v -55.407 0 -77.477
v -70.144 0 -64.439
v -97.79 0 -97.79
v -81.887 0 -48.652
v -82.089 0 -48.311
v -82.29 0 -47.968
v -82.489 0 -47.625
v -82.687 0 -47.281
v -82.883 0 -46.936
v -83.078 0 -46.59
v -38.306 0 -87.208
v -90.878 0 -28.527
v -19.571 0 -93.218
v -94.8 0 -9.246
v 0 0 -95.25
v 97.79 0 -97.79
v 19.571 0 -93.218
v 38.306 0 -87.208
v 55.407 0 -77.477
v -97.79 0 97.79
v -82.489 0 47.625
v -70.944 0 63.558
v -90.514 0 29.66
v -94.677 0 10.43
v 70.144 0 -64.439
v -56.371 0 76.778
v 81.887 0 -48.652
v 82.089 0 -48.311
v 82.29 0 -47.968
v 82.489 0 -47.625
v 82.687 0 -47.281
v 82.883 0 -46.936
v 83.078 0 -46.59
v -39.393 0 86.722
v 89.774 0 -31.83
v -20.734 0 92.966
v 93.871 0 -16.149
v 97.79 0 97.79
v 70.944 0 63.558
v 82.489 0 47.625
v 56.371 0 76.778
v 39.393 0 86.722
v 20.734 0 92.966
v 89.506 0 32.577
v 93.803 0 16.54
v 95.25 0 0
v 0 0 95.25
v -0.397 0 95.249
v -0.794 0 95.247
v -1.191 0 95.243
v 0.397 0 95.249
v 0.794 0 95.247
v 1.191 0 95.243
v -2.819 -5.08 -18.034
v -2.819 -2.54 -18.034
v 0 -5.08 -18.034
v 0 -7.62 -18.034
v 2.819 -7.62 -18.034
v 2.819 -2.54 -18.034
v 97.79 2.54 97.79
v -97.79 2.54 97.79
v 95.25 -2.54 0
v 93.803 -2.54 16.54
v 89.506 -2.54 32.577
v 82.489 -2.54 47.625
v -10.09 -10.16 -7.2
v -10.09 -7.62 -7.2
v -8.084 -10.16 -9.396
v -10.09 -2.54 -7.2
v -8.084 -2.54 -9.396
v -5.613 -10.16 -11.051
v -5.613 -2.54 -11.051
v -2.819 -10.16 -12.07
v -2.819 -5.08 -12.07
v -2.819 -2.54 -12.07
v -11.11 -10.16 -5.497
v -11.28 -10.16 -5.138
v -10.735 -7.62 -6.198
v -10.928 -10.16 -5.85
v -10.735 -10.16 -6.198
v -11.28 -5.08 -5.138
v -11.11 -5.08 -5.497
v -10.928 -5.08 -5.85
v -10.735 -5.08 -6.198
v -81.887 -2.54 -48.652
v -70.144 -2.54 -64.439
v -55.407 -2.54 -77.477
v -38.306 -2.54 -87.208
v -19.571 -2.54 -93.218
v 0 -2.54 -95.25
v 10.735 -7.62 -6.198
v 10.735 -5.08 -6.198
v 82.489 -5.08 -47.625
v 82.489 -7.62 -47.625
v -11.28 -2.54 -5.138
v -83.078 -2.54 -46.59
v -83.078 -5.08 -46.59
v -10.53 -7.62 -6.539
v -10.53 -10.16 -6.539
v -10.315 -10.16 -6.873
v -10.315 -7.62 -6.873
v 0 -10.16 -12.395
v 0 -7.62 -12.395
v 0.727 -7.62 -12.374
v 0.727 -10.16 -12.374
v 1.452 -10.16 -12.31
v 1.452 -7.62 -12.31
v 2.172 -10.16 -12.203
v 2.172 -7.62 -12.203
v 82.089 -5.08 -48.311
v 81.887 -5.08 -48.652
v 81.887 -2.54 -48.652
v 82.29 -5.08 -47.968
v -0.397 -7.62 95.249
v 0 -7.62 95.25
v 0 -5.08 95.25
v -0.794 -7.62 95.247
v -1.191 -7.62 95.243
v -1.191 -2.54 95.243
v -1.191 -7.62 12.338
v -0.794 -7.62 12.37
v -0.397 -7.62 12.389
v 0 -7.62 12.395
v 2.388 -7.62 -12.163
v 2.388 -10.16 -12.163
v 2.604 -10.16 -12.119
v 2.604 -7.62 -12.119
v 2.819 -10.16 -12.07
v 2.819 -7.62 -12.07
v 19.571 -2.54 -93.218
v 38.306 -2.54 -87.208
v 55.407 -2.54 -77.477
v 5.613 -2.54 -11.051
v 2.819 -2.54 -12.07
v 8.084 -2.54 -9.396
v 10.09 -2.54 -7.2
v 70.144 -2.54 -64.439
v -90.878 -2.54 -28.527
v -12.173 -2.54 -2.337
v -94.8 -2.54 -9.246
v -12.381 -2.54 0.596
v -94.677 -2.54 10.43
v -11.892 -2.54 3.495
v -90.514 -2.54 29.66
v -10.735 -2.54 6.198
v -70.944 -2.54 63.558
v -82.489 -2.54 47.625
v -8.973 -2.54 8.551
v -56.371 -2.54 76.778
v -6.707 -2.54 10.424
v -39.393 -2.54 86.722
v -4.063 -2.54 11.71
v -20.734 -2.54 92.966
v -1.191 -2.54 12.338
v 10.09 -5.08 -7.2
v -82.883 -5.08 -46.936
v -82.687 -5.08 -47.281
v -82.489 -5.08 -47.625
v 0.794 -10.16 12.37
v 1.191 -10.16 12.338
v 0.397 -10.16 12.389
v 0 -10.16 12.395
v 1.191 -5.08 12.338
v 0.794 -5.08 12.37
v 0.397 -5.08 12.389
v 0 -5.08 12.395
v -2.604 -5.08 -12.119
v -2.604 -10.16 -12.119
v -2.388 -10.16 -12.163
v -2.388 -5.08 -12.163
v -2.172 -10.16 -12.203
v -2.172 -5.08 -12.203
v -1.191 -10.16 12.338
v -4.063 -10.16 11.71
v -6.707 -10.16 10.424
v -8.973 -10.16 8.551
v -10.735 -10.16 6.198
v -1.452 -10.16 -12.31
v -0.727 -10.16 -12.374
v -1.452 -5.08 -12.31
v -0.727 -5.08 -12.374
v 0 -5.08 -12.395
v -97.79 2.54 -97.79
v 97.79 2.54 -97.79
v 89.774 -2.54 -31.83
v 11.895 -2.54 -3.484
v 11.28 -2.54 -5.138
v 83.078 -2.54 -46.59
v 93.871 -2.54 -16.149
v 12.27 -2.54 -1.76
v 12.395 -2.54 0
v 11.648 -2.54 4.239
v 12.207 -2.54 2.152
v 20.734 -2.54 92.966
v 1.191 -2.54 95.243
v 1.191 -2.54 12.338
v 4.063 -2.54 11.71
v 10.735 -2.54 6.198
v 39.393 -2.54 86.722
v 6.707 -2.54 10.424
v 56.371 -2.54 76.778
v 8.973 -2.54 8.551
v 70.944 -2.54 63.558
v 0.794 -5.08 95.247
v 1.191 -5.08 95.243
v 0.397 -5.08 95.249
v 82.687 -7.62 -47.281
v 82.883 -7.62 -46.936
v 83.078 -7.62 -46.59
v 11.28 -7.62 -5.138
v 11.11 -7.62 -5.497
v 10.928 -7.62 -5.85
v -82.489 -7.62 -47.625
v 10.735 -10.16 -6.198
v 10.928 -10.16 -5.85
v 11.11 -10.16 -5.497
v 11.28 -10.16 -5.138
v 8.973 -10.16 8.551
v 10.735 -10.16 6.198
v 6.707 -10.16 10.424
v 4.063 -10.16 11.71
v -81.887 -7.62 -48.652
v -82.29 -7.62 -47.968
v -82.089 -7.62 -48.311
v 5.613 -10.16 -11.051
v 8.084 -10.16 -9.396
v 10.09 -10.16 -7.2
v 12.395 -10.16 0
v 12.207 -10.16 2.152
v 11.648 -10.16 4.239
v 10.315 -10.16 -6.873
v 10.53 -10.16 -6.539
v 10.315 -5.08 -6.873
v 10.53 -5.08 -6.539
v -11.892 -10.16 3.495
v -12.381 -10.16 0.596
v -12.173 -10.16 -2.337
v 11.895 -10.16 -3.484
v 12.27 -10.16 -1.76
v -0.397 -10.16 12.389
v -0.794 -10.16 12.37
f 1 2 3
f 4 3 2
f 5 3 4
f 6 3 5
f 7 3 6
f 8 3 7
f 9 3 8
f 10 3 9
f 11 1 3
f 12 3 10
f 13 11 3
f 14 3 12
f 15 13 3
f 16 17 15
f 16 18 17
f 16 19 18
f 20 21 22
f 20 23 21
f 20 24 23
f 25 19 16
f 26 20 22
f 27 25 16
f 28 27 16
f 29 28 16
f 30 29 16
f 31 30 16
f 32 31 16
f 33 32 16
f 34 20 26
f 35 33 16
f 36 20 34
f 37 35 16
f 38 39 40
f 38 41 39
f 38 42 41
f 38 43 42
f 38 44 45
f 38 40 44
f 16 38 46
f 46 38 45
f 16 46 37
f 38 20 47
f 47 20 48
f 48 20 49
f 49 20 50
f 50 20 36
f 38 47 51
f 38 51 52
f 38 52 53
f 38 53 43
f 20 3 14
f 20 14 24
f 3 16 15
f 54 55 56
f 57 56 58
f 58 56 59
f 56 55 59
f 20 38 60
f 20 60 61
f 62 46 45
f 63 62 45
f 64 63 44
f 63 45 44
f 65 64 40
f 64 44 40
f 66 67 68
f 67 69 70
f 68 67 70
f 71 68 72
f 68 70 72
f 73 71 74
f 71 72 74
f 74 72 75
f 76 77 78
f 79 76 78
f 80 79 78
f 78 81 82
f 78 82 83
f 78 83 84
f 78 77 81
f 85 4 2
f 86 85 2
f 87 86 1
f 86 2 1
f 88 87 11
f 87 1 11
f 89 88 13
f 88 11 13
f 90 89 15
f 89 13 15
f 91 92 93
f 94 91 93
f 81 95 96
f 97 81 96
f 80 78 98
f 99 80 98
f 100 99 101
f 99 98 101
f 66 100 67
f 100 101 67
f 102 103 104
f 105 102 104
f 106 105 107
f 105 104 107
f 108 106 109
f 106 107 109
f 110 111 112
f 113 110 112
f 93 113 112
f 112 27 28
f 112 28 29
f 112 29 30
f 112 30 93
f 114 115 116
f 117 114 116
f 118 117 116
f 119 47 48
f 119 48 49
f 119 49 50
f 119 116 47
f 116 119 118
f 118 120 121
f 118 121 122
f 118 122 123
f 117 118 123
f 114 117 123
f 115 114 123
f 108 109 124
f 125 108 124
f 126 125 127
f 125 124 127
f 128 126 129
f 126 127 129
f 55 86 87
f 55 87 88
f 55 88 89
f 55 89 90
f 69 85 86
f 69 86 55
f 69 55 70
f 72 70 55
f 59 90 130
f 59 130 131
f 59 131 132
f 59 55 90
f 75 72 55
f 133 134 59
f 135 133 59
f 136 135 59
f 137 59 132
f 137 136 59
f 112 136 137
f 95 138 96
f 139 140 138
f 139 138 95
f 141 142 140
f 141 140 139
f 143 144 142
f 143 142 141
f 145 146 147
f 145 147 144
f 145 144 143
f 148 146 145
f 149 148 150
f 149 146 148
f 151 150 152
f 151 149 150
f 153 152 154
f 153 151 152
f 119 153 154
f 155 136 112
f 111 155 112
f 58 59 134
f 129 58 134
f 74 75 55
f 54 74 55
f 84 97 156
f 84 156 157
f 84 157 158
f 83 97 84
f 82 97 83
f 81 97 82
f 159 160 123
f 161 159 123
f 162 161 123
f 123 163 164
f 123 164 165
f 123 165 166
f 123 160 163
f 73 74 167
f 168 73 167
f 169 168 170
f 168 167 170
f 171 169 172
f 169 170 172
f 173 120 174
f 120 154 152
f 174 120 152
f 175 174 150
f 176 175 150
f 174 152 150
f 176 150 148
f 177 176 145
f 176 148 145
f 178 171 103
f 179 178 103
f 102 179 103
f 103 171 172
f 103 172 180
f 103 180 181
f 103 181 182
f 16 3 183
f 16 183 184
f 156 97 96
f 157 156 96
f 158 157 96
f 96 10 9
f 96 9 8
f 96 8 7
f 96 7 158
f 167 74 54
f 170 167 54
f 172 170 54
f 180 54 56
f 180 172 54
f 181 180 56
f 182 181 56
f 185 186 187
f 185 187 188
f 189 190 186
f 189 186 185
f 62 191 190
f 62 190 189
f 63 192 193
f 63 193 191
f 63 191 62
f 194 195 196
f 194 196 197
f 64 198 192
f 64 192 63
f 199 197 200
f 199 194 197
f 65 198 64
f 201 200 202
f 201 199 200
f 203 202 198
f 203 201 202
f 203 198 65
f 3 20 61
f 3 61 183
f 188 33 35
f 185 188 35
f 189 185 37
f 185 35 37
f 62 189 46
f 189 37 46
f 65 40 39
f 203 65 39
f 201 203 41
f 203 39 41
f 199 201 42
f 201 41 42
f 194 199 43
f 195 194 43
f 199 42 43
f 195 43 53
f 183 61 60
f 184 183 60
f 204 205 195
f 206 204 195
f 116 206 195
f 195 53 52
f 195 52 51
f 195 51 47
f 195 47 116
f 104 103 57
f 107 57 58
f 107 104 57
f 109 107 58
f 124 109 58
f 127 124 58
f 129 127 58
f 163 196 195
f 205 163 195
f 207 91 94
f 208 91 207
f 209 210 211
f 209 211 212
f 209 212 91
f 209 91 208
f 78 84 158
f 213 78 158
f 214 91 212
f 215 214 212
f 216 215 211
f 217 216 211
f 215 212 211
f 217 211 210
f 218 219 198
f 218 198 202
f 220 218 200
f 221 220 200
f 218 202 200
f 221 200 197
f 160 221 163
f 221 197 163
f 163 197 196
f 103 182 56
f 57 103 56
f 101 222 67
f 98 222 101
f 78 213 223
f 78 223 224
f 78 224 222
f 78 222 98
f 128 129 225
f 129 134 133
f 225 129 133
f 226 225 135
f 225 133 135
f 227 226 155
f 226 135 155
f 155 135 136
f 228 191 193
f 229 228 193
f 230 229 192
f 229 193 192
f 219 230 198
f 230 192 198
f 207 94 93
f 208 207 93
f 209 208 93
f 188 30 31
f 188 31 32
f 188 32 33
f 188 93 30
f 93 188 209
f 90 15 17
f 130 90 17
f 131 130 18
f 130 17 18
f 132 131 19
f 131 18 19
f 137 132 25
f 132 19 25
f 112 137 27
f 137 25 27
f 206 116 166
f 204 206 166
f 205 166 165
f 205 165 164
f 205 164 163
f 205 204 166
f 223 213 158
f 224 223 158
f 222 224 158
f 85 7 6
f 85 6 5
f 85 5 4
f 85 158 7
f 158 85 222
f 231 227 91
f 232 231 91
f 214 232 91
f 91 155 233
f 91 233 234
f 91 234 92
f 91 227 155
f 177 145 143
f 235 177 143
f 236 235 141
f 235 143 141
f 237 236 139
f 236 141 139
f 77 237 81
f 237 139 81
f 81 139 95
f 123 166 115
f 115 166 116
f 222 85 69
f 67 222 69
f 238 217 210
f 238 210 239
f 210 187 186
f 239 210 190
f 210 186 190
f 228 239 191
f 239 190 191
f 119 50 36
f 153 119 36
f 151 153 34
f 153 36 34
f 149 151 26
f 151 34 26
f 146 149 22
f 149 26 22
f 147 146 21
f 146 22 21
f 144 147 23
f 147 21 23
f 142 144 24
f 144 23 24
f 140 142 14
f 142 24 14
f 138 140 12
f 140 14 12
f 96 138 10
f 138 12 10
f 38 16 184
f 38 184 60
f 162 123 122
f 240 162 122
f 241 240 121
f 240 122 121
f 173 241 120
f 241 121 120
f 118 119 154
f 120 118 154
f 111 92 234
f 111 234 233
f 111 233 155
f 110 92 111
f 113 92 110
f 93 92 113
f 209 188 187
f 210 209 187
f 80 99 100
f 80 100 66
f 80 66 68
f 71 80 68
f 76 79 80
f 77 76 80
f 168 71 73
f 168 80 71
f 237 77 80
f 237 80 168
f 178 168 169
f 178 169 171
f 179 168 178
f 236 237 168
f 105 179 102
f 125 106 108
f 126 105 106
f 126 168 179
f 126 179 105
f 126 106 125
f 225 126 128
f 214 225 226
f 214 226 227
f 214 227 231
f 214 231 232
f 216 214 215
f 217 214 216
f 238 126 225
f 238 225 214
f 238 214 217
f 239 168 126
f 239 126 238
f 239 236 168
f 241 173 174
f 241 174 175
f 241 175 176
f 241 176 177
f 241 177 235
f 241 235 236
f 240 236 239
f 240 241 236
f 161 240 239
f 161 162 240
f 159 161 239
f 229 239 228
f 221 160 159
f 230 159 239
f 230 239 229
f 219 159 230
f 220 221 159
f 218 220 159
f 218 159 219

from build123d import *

# Parameters (mm, degrees)
F1_DEPTH = 2.54
F2_DEPTH = 5.08
F3_DEPTH = 2.54
F4_DEPTH = 7.62
F5_DEPTH = 10.16


with BuildPart() as f1:
    # F0 (on Front) → F1 (new body)
    with BuildSketch(Plane.XZ):
        with BuildLine():
            ThreePointArc((82.4889197105, 47.625), (92.004434954, 24.652514046), (95.25, 0))
            ThreePointArc((95.25, 0), (92.156719127, -24.0769935778), (83.0777875119, -46.5901676551))
            ThreePointArc((83.0777875119, -46.5901676551), (82.7849705841, -47.1085039605), (82.4889197105, -47.625))
            ThreePointArc((82.4889197105, -47.625), (82.1896464561, -48.1396355971), (81.8871625119, -48.6523906479))
            ThreePointArc((81.8871625119, -48.6523906479), (47.1085039605, -82.7849705841), (0, -95.25))
            Line((0, -95.25), (0, -97.79))
            Line((0, -97.79), (97.79, -97.79))
            Line((97.79, -97.79), (97.79, 97.79))
            Line((97.79, 97.79), (0, 97.79))
            Line((0, 97.79), (0, 95.25))
            ThreePointArc((0, 95.25), (0.595324128, 95.2481395576), (1.190625, 95.242558303))
            ThreePointArc((1.190625, 95.242558303), (48.1396355971, 82.1896464561), (82.4889197105, 47.625))
        make_face()
        with BuildLine():
            ThreePointArc((-1.190625, 95.242558303), (-0.595324128, 95.2481395576), (0, 95.25))
            Line((0, 95.25), (0, 97.79))
            Line((0, 97.79), (-97.79, 97.79))
            Line((-97.79, 97.79), (-97.79, -97.79))
            Line((-97.79, -97.79), (0, -97.79))
            Line((0, -97.79), (0, -95.25))
            ThreePointArc((0, -95.25), (-47.1085039605, -82.7849705841), (-81.8871625119, -48.6523906479))
            ThreePointArc((-81.8871625119, -48.6523906479), (-82.1896464561, -48.1396355971), (-82.4889197105, -47.625))
            ThreePointArc((-82.4889197105, -47.625), (-82.7849705841, -47.1085039605), (-83.0777875119, -46.5901676551))
            ThreePointArc((-83.0777875119, -46.5901676551), (-95.2481395576, 0.595324128), (-82.4889197105, 47.625))
            ThreePointArc((-82.4889197105, 47.625), (-48.1396355971, 82.1896464561), (-1.190625, 95.242558303))
        make_face()
        with BuildLine():
            Line((-1.190625, 12.3378845492), (-1.190625, 95.242558303))
            ThreePointArc((-1.190625, 95.242558303), (-48.1396355971, 82.1896464561), (-82.4889197105, 47.625))
            Line((-82.4889197105, 47.625), (-10.734558085, 6.1976))
            ThreePointArc((-10.734558085, 6.1976), (-6.7065841894, 10.4241408064), (-1.190625, 12.3378845492))
        make_face()
        with BuildLine():
            Line((0, -12.3952), (0, -1.3748153285))
            Line((0, -1.3748153285), (-2.1717, -2.6286469081))
            Line((-2.1717, -2.6286469081), (-2.1717, -12.2034709059))
            ThreePointArc((-2.1717, -12.2034709059), (-1.0900734993, -12.3471746892), (0, -12.3952))
        make_face()
        with BuildLine():
            ThreePointArc((0, -95.25), (47.1085039605, -82.7849705841), (81.8871625119, -48.6523906479))
            Line((81.8871625119, -48.6523906479), (10.0896089486, -7.200053771))
            ThreePointArc((10.0896089486, -7.200053771), (6.8985820933, -10.2980846832), (2.8194, -12.0702927338))
            Line((2.8194, -12.0702927338), (2.8194, -15.2146))
            Line((2.8194, -15.2146), (2.8194, -18.034))
            Line((2.8194, -18.034), (0, -18.034))
            Line((0, -18.034), (0, -95.25))
        make_face()
        with BuildLine():
            Line((1.190625, 0.6874076643), (10.734558085, 6.1976))
            ThreePointArc((10.734558085, 6.1976), (6.7065841894, 10.4241408064), (1.190625, 12.3378845492))
            Line((1.190625, 12.3378845492), (1.190625, 0.6874076643))
        make_face()
        with BuildLine():
            Line((-1.190625, 0.6874076643), (-1.190625, 12.3378845492))
            ThreePointArc((-1.190625, 12.3378845492), (-6.7065841894, 10.4241408064), (-10.734558085, 6.1976))
            Line((-10.734558085, 6.1976), (-1.190625, 0.6874076643))
        make_face()
        with BuildLine():
            Line((-2.8194, -3.0025966775), (-10.0896089486, -7.200053771))
            ThreePointArc((-10.0896089486, -7.200053771), (-6.8985820933, -10.2980846832), (-2.8194, -12.0702927338))
            Line((-2.8194, -12.0702927338), (-2.8194, -3.0025966775))
        make_face()
        with BuildLine():
            ThreePointArc((2.8194, -12.0702927338), (6.8985820933, -10.2980846832), (10.0896089486, -7.200053771))
            Line((10.0896089486, -7.200053771), (2.8194, -3.0025966775))
            Line((2.8194, -3.0025966775), (2.8194, -12.0702927338))
        make_face()
        with BuildLine():
            ThreePointArc((-81.8871625119, -48.6523906479), (-47.1085039605, -82.7849705841), (0, -95.25))
            Line((0, -95.25), (0, -18.034))
            Line((0, -18.034), (-2.8194, -18.034))
            Line((-2.8194, -18.034), (-2.8194, -15.2146))
            Line((-2.8194, -15.2146), (-2.8194, -12.0702927338))
            ThreePointArc((-2.8194, -12.0702927338), (-6.8985820933, -10.2980846832), (-10.0896089486, -7.200053771))
            Line((-10.0896089486, -7.200053771), (-81.8871625119, -48.6523906479))
        make_face()
        with BuildLine():
            Line((-10.734558085, 6.1976), (-82.4889197105, 47.625))
            ThreePointArc((-82.4889197105, 47.625), (-95.2481395576, 0.595324128), (-83.0777875119, -46.5901676551))
            Line((-83.0777875119, -46.5901676551), (-11.2802339486, -5.1378307782))
            ThreePointArc((-11.2802339486, -5.1378307782), (-12.3808628456, 0.5960018774), (-10.734558085, 6.1976))
        make_face()
        with BuildLine():
            Line((-2.8194, -0.2529660204), (-1.190625, 0.6874076643))
            Line((-1.190625, 0.6874076643), (-10.734558085, 6.1976))
            ThreePointArc((-10.734558085, 6.1976), (-12.3808628456, 0.5960018774), (-11.2802339486, -5.1378307782))
            Line((-11.2802339486, -5.1378307782), (-2.8194, -0.2529660204))
        make_face()
        with BuildLine():
            ThreePointArc((83.0777875119, -46.5901676551), (92.156719127, -24.0769935778), (95.25, 0))
            ThreePointArc((95.25, 0), (92.004434954, 24.652514046), (82.4889197105, 47.625))
            Line((82.4889197105, 47.625), (10.734558085, 6.1976))
            ThreePointArc((10.734558085, 6.1976), (11.972843802, 3.2081138279), (12.3952, 0))
            ThreePointArc((12.3952, 0), (12.1132518111, -2.6287094933), (11.2802339486, -5.1378307782))
            Line((11.2802339486, -5.1378307782), (83.0777875119, -46.5901676551))
        make_face()
        with BuildLine():
            Line((10.734558085, 6.1976), (82.4889197105, 47.625))
            ThreePointArc((82.4889197105, 47.625), (48.1396355971, 82.1896464561), (1.190625, 95.242558303))
            Line((1.190625, 95.242558303), (1.190625, 12.3378845492))
            ThreePointArc((1.190625, 12.3378845492), (6.7065841894, 10.4241408064), (10.734558085, 6.1976))
        make_face()
        with BuildLine():
            ThreePointArc((12.3952, 0), (11.972843802, 3.2081138279), (10.734558085, 6.1976))
            Line((10.734558085, 6.1976), (1.190625, 0.6874076643))
            Line((1.190625, 0.6874076643), (2.8194, -0.2529660204))
            Line((2.8194, -0.2529660204), (11.2802339486, -5.1378307782))
            ThreePointArc((11.2802339486, -5.1378307782), (12.1132518111, -2.6287094933), (12.3952, 0))
        make_face()
        with BuildLine():
            Line((2.1717, -2.6286469081), (0, -1.3748153285))
            Line((0, -1.3748153285), (0, -12.3952))
            ThreePointArc((0, -12.3952), (1.0900734993, -12.3471746892), (2.1717, -12.2034709059))
            Line((2.1717, -12.2034709059), (2.1717, -2.6286469081))
        make_face()
        with BuildLine():
            ThreePointArc((-2.1717, -13.4166190574), (-1.199956018, -12.6633019157), (0, -12.3952))
            ThreePointArc((0, -12.3952), (-1.0900734993, -12.3471746892), (-2.1717, -12.2034709059))
            Line((-2.1717, -12.2034709059), (-2.1717, -13.4166190574))
        make_face()
        with BuildLine():
            ThreePointArc((10.734558085, -6.1976), (11.0201426838, -5.6742786563), (11.2802339486, -5.1378307782))
            Line((11.2802339486, -5.1378307782), (2.8194, -0.2529660204))
            Line((2.8194, -0.2529660204), (2.8194, -1.627781349))
            Line((2.8194, -1.627781349), (10.734558085, -6.1976))
        make_face()
        with BuildLine():
            Line((-2.1717, -12.2034709059), (-2.1717, -2.6286469081))
            Line((-2.1717, -2.6286469081), (-2.8194, -3.0025966775))
            Line((-2.8194, -3.0025966775), (-2.8194, -12.0702927338))
            ThreePointArc((-2.8194, -12.0702927338), (-2.4964382446, -12.1412017169), (-2.1717, -12.2034709059))
        make_face()
        with BuildLine():
            Line((-10.734558085, -6.1976), (-2.8194, -1.627781349))
            Line((-2.8194, -1.627781349), (-2.8194, -0.2529660204))
            Line((-2.8194, -0.2529660204), (-11.2802339486, -5.1378307782))
            ThreePointArc((-11.2802339486, -5.1378307782), (-11.0201426838, -5.6742786563), (-10.734558085, -6.1976))
        make_face()
        with BuildLine():
            Line((1.190625, 0.6874076643), (1.190625, 12.3378845492))
            ThreePointArc((1.190625, 12.3378845492), (0.5960018774, 12.3808628456), (0, 12.3952))
            Line((0, 12.3952), (0, 0))
            Line((0, 0), (1.190625, 0.6874076643))
        make_face()
        with BuildLine():
            Line((-11.2802339486, -5.1378307782), (-83.0777875119, -46.5901676551))
            ThreePointArc((-83.0777875119, -46.5901676551), (-82.7849705841, -47.1085039605), (-82.4889197105, -47.625))
            Line((-82.4889197105, -47.625), (-10.734558085, -6.1976))
            ThreePointArc((-10.734558085, -6.1976), (-11.0201426838, -5.6742786563), (-11.2802339486, -5.1378307782))
        make_face()
        with BuildLine():
            Line((0, 0), (0, 12.3952))
            ThreePointArc((0, 12.3952), (-0.5960018774, 12.3808628456), (-1.190625, 12.3378845492))
            Line((-1.190625, 12.3378845492), (-1.190625, 0.6874076643))
            Line((-1.190625, 0.6874076643), (0, 0))
        make_face()
        with BuildLine():
            ThreePointArc((-82.4889197105, -47.625), (-82.1896464561, -48.1396355971), (-81.8871625119, -48.6523906479))
            Line((-81.8871625119, -48.6523906479), (-10.0896089486, -7.200053771))
            ThreePointArc((-10.0896089486, -7.200053771), (-10.4241408064, -6.7065841894), (-10.734558085, -6.1976))
            Line((-10.734558085, -6.1976), (-82.4889197105, -47.625))
        make_face()
        Polygon((-2.1717, -2.6286469081), (-2.1717, -1.2538315796), (-2.8194, -1.627781349), (-2.8194, -3.0025966775), align=None)
        with BuildLine():
            Line((0, 12.3952), (0, 95.25))
            ThreePointArc((0, 95.25), (-0.595324128, 95.2481395576), (-1.190625, 95.242558303))
            Line((-1.190625, 95.242558303), (-1.190625, 12.3378845492))
            ThreePointArc((-1.190625, 12.3378845492), (-0.5960018774, 12.3808628456), (0, 12.3952))
        make_face()
        with BuildLine():
            ThreePointArc((10.0896089486, -7.200053771), (10.4241408064, -6.7065841894), (10.734558085, -6.1976))
            Line((10.734558085, -6.1976), (2.8194, -1.627781349))
            Line((2.8194, -1.627781349), (2.8194, -3.0025966775))
            Line((2.8194, -3.0025966775), (10.0896089486, -7.200053771))
        make_face()
        with BuildLine():
            Line((-2.8194, -3.0025966775), (-2.8194, -1.627781349))
            Line((-2.8194, -1.627781349), (-10.734558085, -6.1976))
            ThreePointArc((-10.734558085, -6.1976), (-10.4241408064, -6.7065841894), (-10.0896089486, -7.200053771))
            Line((-10.0896089486, -7.200053771), (-2.8194, -3.0025966775))
        make_face()
        with BuildLine():
            ThreePointArc((82.4889197105, -47.625), (82.7849705841, -47.1085039605), (83.0777875119, -46.5901676551))
            Line((83.0777875119, -46.5901676551), (11.2802339486, -5.1378307782))
            ThreePointArc((11.2802339486, -5.1378307782), (11.0201426838, -5.6742786563), (10.734558085, -6.1976))
            Line((10.734558085, -6.1976), (82.4889197105, -47.625))
        make_face()
        with BuildLine():
            ThreePointArc((81.8871625119, -48.6523906479), (82.1896464561, -48.1396355971), (82.4889197105, -47.625))
            Line((82.4889197105, -47.625), (10.734558085, -6.1976))
            ThreePointArc((10.734558085, -6.1976), (10.4241408064, -6.7065841894), (10.0896089486, -7.200053771))
            Line((10.0896089486, -7.200053771), (81.8871625119, -48.6523906479))
        make_face()
        with BuildLine():
            Line((1.190625, 12.3378845492), (1.190625, 95.242558303))
            ThreePointArc((1.190625, 95.242558303), (0.595324128, 95.2481395576), (0, 95.25))
            Line((0, 95.25), (0, 12.3952))
            ThreePointArc((0, 12.3952), (0.5960018774, 12.3808628456), (1.190625, 12.3378845492))
        make_face()
        Polygon((2.1717, -1.2538315796), (0, 0), (0, -1.3748153285), (2.1717, -2.6286469081), align=None)
        Polygon((2.8194, -3.0025966775), (2.8194, -1.627781349), (2.1717, -1.2538315796), (2.1717, -2.6286469081), align=None)
        with BuildLine():
            ThreePointArc((2.1717, -14.5669), (1.5356237967, -13.0312762033), (0, -12.3952))
            Line((0, -12.3952), (0, -16.7386))
            ThreePointArc((0, -16.7386), (1.5356237967, -16.1025237967), (2.1717, -14.5669))
        make_face()
        Polygon((0, -1.3748153285), (0, 0), (-2.1717, -1.2538315796), (-2.1717, -2.6286469081), align=None)
        with BuildLine():
            ThreePointArc((2.1717, -12.2034709059), (2.4964382446, -12.1412017169), (2.8194, -12.0702927338))
            Line((2.8194, -12.0702927338), (2.8194, -3.0025966775))
            Line((2.8194, -3.0025966775), (2.1717, -2.6286469081))
            Line((2.1717, -2.6286469081), (2.1717, -12.2034709059))
        make_face()
        with BuildLine():
            Line((-2.8194, -12.0702927338), (-2.8194, -15.2146))
            ThreePointArc((-2.8194, -15.2146), (-2.6525372137, -14.2590568613), (-2.1717, -13.4166190574))
            Line((-2.1717, -13.4166190574), (-2.1717, -12.2034709059))
            ThreePointArc((-2.1717, -12.2034709059), (-2.4964382446, -12.1412017169), (-2.8194, -12.0702927338))
        make_face()
        with BuildLine():
            Line((2.8194, -15.2146), (2.8194, -12.0702927338))
            ThreePointArc((2.8194, -12.0702927338), (2.4964382446, -12.1412017169), (2.1717, -12.2034709059))
            Line((2.1717, -12.2034709059), (2.1717, -13.4166190574))
            ThreePointArc((2.1717, -13.4166190574), (2.6525372137, -14.2590568613), (2.8194, -15.2146))
        make_face()
        with BuildLine():
            Line((-2.1717, -16.7386), (0, -16.7386))
            ThreePointArc((0, -16.7386), (-1.5356237967, -16.1025237967), (-2.1717, -14.5669))
            Line((-2.1717, -14.5669), (-2.1717, -16.7386))
        make_face()
        with BuildLine():
            ThreePointArc((2.1717, -13.4166190574), (1.199956018, -12.6633019157), (0, -12.3952))
            ThreePointArc((0, -12.3952), (1.5356237967, -13.0312762033), (2.1717, -14.5669))
            Line((2.1717, -14.5669), (2.1717, -13.4166190574))
        make_face()
        with BuildLine():
            ThreePointArc((2.1717, -12.2034709059), (1.0900734993, -12.3471746892), (0, -12.3952))
            ThreePointArc((0, -12.3952), (1.199956018, -12.6633019157), (2.1717, -13.4166190574))
            Line((2.1717, -13.4166190574), (2.1717, -12.2034709059))
        make_face()
        with BuildLine():
            ThreePointArc((-2.8194, -15.2146), (-1.9936168589, -17.2082168589), (0, -18.034))
            Line((0, -18.034), (0, -16.7386))
            Line((0, -16.7386), (-2.1717, -16.7386))
            Line((-2.1717, -16.7386), (-2.1717, -14.5669))
            Line((-2.1717, -14.5669), (-2.1717, -13.4166190574))
            ThreePointArc((-2.1717, -13.4166190574), (-2.6525372137, -14.2590568613), (-2.8194, -15.2146))
        make_face()
        with BuildLine():
            ThreePointArc((-2.1717, -14.5669), (-1.5356237967, -13.0312762033), (0, -12.3952))
            ThreePointArc((0, -12.3952), (-1.199956018, -12.6633019157), (-2.1717, -13.4166190574))
            Line((-2.1717, -13.4166190574), (-2.1717, -14.5669))
        make_face()
        with BuildLine():
            Line((0, -16.7386), (0, -18.034))
            ThreePointArc((0, -18.034), (1.9936168589, -17.2082168589), (2.8194, -15.2146))
            ThreePointArc((2.8194, -15.2146), (2.6525372137, -14.2590568613), (2.1717, -13.4166190574))
            Line((2.1717, -13.4166190574), (2.1717, -14.5669))
            Line((2.1717, -14.5669), (2.1717, -16.7386))
            Line((2.1717, -16.7386), (0, -16.7386))
        make_face()
        with BuildLine():
            Line((0, -16.7386), (0, -12.3952))
            ThreePointArc((0, -12.3952), (-1.5356237967, -13.0312762033), (-2.1717, -14.5669))
            ThreePointArc((-2.1717, -14.5669), (-1.5356237967, -16.1025237967), (0, -16.7386))
        make_face()
        with BuildLine():
            ThreePointArc((2.1717, -14.5669), (1.5356237967, -16.1025237967), (0, -16.7386))
            Line((0, -16.7386), (2.1717, -16.7386))
            Line((2.1717, -16.7386), (2.1717, -14.5669))
        make_face()
        with BuildLine():
            Line((-2.8194, -18.034), (0, -18.034))
            ThreePointArc((0, -18.034), (-1.9936168589, -17.2082168589), (-2.8194, -15.2146))
            Line((-2.8194, -15.2146), (-2.8194, -18.034))
        make_face()
        with BuildLine():
            ThreePointArc((2.8194, -15.2146), (1.9936168589, -17.2082168589), (0, -18.034))
            Line((0, -18.034), (2.8194, -18.034))
            Line((2.8194, -18.034), (2.8194, -15.2146))
        make_face()
        Polygon((2.8194, -0.2529660204), (1.190625, 0.6874076643), (0, 0), (2.1717, -1.2538315796), (2.8194, -1.627781349), align=None)
        Polygon((-2.1717, -1.2538315796), (0, 0), (-1.190625, 0.6874076643), (-2.8194, -0.2529660204), (-2.8194, -1.627781349), align=None)
    extrude(amount=-F1_DEPTH)

    # F0 (on Front) → F2 (join)
    with BuildSketch(Plane.XZ):
        with BuildLine():
            Line((1.190625, 12.3378845492), (1.190625, 95.242558303))
            ThreePointArc((1.190625, 95.242558303), (0.595324128, 95.2481395576), (0, 95.25))
            Line((0, 95.25), (0, 12.3952))
            ThreePointArc((0, 12.3952), (0.5960018774, 12.3808628456), (1.190625, 12.3378845492))
        make_face()
        with BuildLine():
            Line((-11.2802339486, -5.1378307782), (-83.0777875119, -46.5901676551))
            ThreePointArc((-83.0777875119, -46.5901676551), (-82.7849705841, -47.1085039605), (-82.4889197105, -47.625))
            Line((-82.4889197105, -47.625), (-10.734558085, -6.1976))
            ThreePointArc((-10.734558085, -6.1976), (-11.0201426838, -5.6742786563), (-11.2802339486, -5.1378307782))
        make_face()
        with BuildLine():
            ThreePointArc((81.8871625119, -48.6523906479), (82.1896464561, -48.1396355971), (82.4889197105, -47.625))
            Line((82.4889197105, -47.625), (10.734558085, -6.1976))
            ThreePointArc((10.734558085, -6.1976), (10.4241408064, -6.7065841894), (10.0896089486, -7.200053771))
            Line((10.0896089486, -7.200053771), (81.8871625119, -48.6523906479))
        make_face()
        with BuildLine():
            Line((0, -16.7386), (0, -12.3952))
            ThreePointArc((0, -12.3952), (-1.5356237967, -13.0312762033), (-2.1717, -14.5669))
            ThreePointArc((-2.1717, -14.5669), (-1.5356237967, -16.1025237967), (0, -16.7386))
        make_face()
        with BuildLine():
            ThreePointArc((-2.1717, -14.5669), (-1.5356237967, -13.0312762033), (0, -12.3952))
            ThreePointArc((0, -12.3952), (-1.199956018, -12.6633019157), (-2.1717, -13.4166190574))
            Line((-2.1717, -13.4166190574), (-2.1717, -14.5669))
        make_face()
        with BuildLine():
            ThreePointArc((-2.1717, -13.4166190574), (-1.199956018, -12.6633019157), (0, -12.3952))
            ThreePointArc((0, -12.3952), (-1.0900734993, -12.3471746892), (-2.1717, -12.2034709059))
            Line((-2.1717, -12.2034709059), (-2.1717, -13.4166190574))
        make_face()
        with BuildLine():
            Line((-2.8194, -12.0702927338), (-2.8194, -15.2146))
            ThreePointArc((-2.8194, -15.2146), (-2.6525372137, -14.2590568613), (-2.1717, -13.4166190574))
            Line((-2.1717, -13.4166190574), (-2.1717, -12.2034709059))
            ThreePointArc((-2.1717, -12.2034709059), (-2.4964382446, -12.1412017169), (-2.8194, -12.0702927338))
        make_face()
        with BuildLine():
            ThreePointArc((-2.8194, -15.2146), (-1.9936168589, -17.2082168589), (0, -18.034))
            Line((0, -18.034), (0, -16.7386))
            Line((0, -16.7386), (-2.1717, -16.7386))
            Line((-2.1717, -16.7386), (-2.1717, -14.5669))
            Line((-2.1717, -14.5669), (-2.1717, -13.4166190574))
            ThreePointArc((-2.1717, -13.4166190574), (-2.6525372137, -14.2590568613), (-2.8194, -15.2146))
        make_face()
        with BuildLine():
            Line((-2.1717, -16.7386), (0, -16.7386))
            ThreePointArc((0, -16.7386), (-1.5356237967, -16.1025237967), (-2.1717, -14.5669))
            Line((-2.1717, -14.5669), (-2.1717, -16.7386))
        make_face()
        with BuildLine():
            Line((-2.8194, -18.034), (0, -18.034))
            ThreePointArc((0, -18.034), (-1.9936168589, -17.2082168589), (-2.8194, -15.2146))
            Line((-2.8194, -15.2146), (-2.8194, -18.034))
        make_face()
    extrude(amount=F2_DEPTH)

    # F0 (on Front) → F3 (join)
    with BuildSketch(Plane.XZ):
        with BuildLine():
            ThreePointArc((-81.8871625119, -48.6523906479), (-47.1085039605, -82.7849705841), (0, -95.25))
            Line((0, -95.25), (0, -18.034))
            Line((0, -18.034), (-2.8194, -18.034))
            Line((-2.8194, -18.034), (-2.8194, -15.2146))
            Line((-2.8194, -15.2146), (-2.8194, -12.0702927338))
            ThreePointArc((-2.8194, -12.0702927338), (-6.8985820933, -10.2980846832), (-10.0896089486, -7.200053771))
            Line((-10.0896089486, -7.200053771), (-81.8871625119, -48.6523906479))
        make_face()
        with BuildLine():
            ThreePointArc((0, -95.25), (47.1085039605, -82.7849705841), (81.8871625119, -48.6523906479))
            Line((81.8871625119, -48.6523906479), (10.0896089486, -7.200053771))
            ThreePointArc((10.0896089486, -7.200053771), (6.8985820933, -10.2980846832), (2.8194, -12.0702927338))
            Line((2.8194, -12.0702927338), (2.8194, -15.2146))
            Line((2.8194, -15.2146), (2.8194, -18.034))
            Line((2.8194, -18.034), (0, -18.034))
            Line((0, -18.034), (0, -95.25))
        make_face()
        with BuildLine():
            ThreePointArc((83.0777875119, -46.5901676551), (92.156719127, -24.0769935778), (95.25, 0))
            ThreePointArc((95.25, 0), (92.004434954, 24.652514046), (82.4889197105, 47.625))
            Line((82.4889197105, 47.625), (10.734558085, 6.1976))
            ThreePointArc((10.734558085, 6.1976), (11.972843802, 3.2081138279), (12.3952, 0))
            ThreePointArc((12.3952, 0), (12.1132518111, -2.6287094933), (11.2802339486, -5.1378307782))
            Line((11.2802339486, -5.1378307782), (83.0777875119, -46.5901676551))
        make_face()
        with BuildLine():
            Line((10.734558085, 6.1976), (82.4889197105, 47.625))
            ThreePointArc((82.4889197105, 47.625), (48.1396355971, 82.1896464561), (1.190625, 95.242558303))
            Line((1.190625, 95.242558303), (1.190625, 12.3378845492))
            ThreePointArc((1.190625, 12.3378845492), (6.7065841894, 10.4241408064), (10.734558085, 6.1976))
        make_face()
        with BuildLine():
            Line((-1.190625, 12.3378845492), (-1.190625, 95.242558303))
            ThreePointArc((-1.190625, 95.242558303), (-48.1396355971, 82.1896464561), (-82.4889197105, 47.625))
            Line((-82.4889197105, 47.625), (-10.734558085, 6.1976))
            ThreePointArc((-10.734558085, 6.1976), (-6.7065841894, 10.4241408064), (-1.190625, 12.3378845492))
        make_face()
        with BuildLine():
            Line((-10.734558085, 6.1976), (-82.4889197105, 47.625))
            ThreePointArc((-82.4889197105, 47.625), (-95.2481395576, 0.595324128), (-83.0777875119, -46.5901676551))
            Line((-83.0777875119, -46.5901676551), (-11.2802339486, -5.1378307782))
            ThreePointArc((-11.2802339486, -5.1378307782), (-12.3808628456, 0.5960018774), (-10.734558085, 6.1976))
        make_face()
    extrude(amount=F3_DEPTH)

    # F0 (on Front) → F4 (join)
    with BuildSketch(Plane.XZ):
        with BuildLine():
            ThreePointArc((-82.4889197105, -47.625), (-82.1896464561, -48.1396355971), (-81.8871625119, -48.6523906479))
            Line((-81.8871625119, -48.6523906479), (-10.0896089486, -7.200053771))
            ThreePointArc((-10.0896089486, -7.200053771), (-10.4241408064, -6.7065841894), (-10.734558085, -6.1976))
            Line((-10.734558085, -6.1976), (-82.4889197105, -47.625))
        make_face()
        with BuildLine():
            ThreePointArc((82.4889197105, -47.625), (82.7849705841, -47.1085039605), (83.0777875119, -46.5901676551))
            Line((83.0777875119, -46.5901676551), (11.2802339486, -5.1378307782))
            ThreePointArc((11.2802339486, -5.1378307782), (11.0201426838, -5.6742786563), (10.734558085, -6.1976))
            Line((10.734558085, -6.1976), (82.4889197105, -47.625))
        make_face()
        with BuildLine():
            Line((0, 12.3952), (0, 95.25))
            ThreePointArc((0, 95.25), (-0.595324128, 95.2481395576), (-1.190625, 95.242558303))
            Line((-1.190625, 95.242558303), (-1.190625, 12.3378845492))
            ThreePointArc((-1.190625, 12.3378845492), (-0.5960018774, 12.3808628456), (0, 12.3952))
        make_face()
        with BuildLine():
            ThreePointArc((2.8194, -15.2146), (1.9936168589, -17.2082168589), (0, -18.034))
            Line((0, -18.034), (2.8194, -18.034))
            Line((2.8194, -18.034), (2.8194, -15.2146))
        make_face()
        with BuildLine():
            Line((0, -16.7386), (0, -18.034))
            ThreePointArc((0, -18.034), (1.9936168589, -17.2082168589), (2.8194, -15.2146))
            ThreePointArc((2.8194, -15.2146), (2.6525372137, -14.2590568613), (2.1717, -13.4166190574))
            Line((2.1717, -13.4166190574), (2.1717, -14.5669))
            Line((2.1717, -14.5669), (2.1717, -16.7386))
            Line((2.1717, -16.7386), (0, -16.7386))
        make_face()
        with BuildLine():
            ThreePointArc((2.1717, -14.5669), (1.5356237967, -16.1025237967), (0, -16.7386))
            Line((0, -16.7386), (2.1717, -16.7386))
            Line((2.1717, -16.7386), (2.1717, -14.5669))
        make_face()
        with BuildLine():
            ThreePointArc((2.1717, -14.5669), (1.5356237967, -13.0312762033), (0, -12.3952))
            Line((0, -12.3952), (0, -16.7386))
            ThreePointArc((0, -16.7386), (1.5356237967, -16.1025237967), (2.1717, -14.5669))
        make_face()
        with BuildLine():
            ThreePointArc((2.1717, -13.4166190574), (1.199956018, -12.6633019157), (0, -12.3952))
            ThreePointArc((0, -12.3952), (1.5356237967, -13.0312762033), (2.1717, -14.5669))
            Line((2.1717, -14.5669), (2.1717, -13.4166190574))
        make_face()
        with BuildLine():
            Line((2.8194, -15.2146), (2.8194, -12.0702927338))
            ThreePointArc((2.8194, -12.0702927338), (2.4964382446, -12.1412017169), (2.1717, -12.2034709059))
            Line((2.1717, -12.2034709059), (2.1717, -13.4166190574))
            ThreePointArc((2.1717, -13.4166190574), (2.6525372137, -14.2590568613), (2.8194, -15.2146))
        make_face()
        with BuildLine():
            ThreePointArc((2.1717, -12.2034709059), (1.0900734993, -12.3471746892), (0, -12.3952))
            ThreePointArc((0, -12.3952), (1.199956018, -12.6633019157), (2.1717, -13.4166190574))
            Line((2.1717, -13.4166190574), (2.1717, -12.2034709059))
        make_face()
    extrude(amount=F4_DEPTH)

    # F0 (on Front) → F5 (join)
    with BuildSketch(Plane.XZ):
        with BuildLine():
            Line((-1.190625, 0.6874076643), (-1.190625, 12.3378845492))
            ThreePointArc((-1.190625, 12.3378845492), (-6.7065841894, 10.4241408064), (-10.734558085, 6.1976))
            Line((-10.734558085, 6.1976), (-1.190625, 0.6874076643))
        make_face()
        with BuildLine():
            Line((0, 0), (0, 12.3952))
            ThreePointArc((0, 12.3952), (-0.5960018774, 12.3808628456), (-1.190625, 12.3378845492))
            Line((-1.190625, 12.3378845492), (-1.190625, 0.6874076643))
            Line((-1.190625, 0.6874076643), (0, 0))
        make_face()
        with BuildLine():
            Line((1.190625, 0.6874076643), (1.190625, 12.3378845492))
            ThreePointArc((1.190625, 12.3378845492), (0.5960018774, 12.3808628456), (0, 12.3952))
            Line((0, 12.3952), (0, 0))
            Line((0, 0), (1.190625, 0.6874076643))
        make_face()
        with BuildLine():
            Line((1.190625, 0.6874076643), (10.734558085, 6.1976))
            ThreePointArc((10.734558085, 6.1976), (6.7065841894, 10.4241408064), (1.190625, 12.3378845492))
            Line((1.190625, 12.3378845492), (1.190625, 0.6874076643))
        make_face()
        with BuildLine():
            ThreePointArc((12.3952, 0), (11.972843802, 3.2081138279), (10.734558085, 6.1976))
            Line((10.734558085, 6.1976), (1.190625, 0.6874076643))
            Line((1.190625, 0.6874076643), (2.8194, -0.2529660204))
            Line((2.8194, -0.2529660204), (11.2802339486, -5.1378307782))
            ThreePointArc((11.2802339486, -5.1378307782), (12.1132518111, -2.6287094933), (12.3952, 0))
        make_face()
        Polygon((2.8194, -0.2529660204), (1.190625, 0.6874076643), (0, 0), (2.1717, -1.2538315796), (2.8194, -1.627781349), align=None)
        with BuildLine():
            ThreePointArc((10.734558085, -6.1976), (11.0201426838, -5.6742786563), (11.2802339486, -5.1378307782))
            Line((11.2802339486, -5.1378307782), (2.8194, -0.2529660204))
            Line((2.8194, -0.2529660204), (2.8194, -1.627781349))
            Line((2.8194, -1.627781349), (10.734558085, -6.1976))
        make_face()
        with BuildLine():
            ThreePointArc((10.0896089486, -7.200053771), (10.4241408064, -6.7065841894), (10.734558085, -6.1976))
            Line((10.734558085, -6.1976), (2.8194, -1.627781349))
            Line((2.8194, -1.627781349), (2.8194, -3.0025966775))
            Line((2.8194, -3.0025966775), (10.0896089486, -7.200053771))
        make_face()
        Polygon((2.1717, -1.2538315796), (0, 0), (0, -1.3748153285), (2.1717, -2.6286469081), align=None)
        Polygon((2.8194, -3.0025966775), (2.8194, -1.627781349), (2.1717, -1.2538315796), (2.1717, -2.6286469081), align=None)
        with BuildLine():
            ThreePointArc((2.8194, -12.0702927338), (6.8985820933, -10.2980846832), (10.0896089486, -7.200053771))
            Line((10.0896089486, -7.200053771), (2.8194, -3.0025966775))
            Line((2.8194, -3.0025966775), (2.8194, -12.0702927338))
        make_face()
        with BuildLine():
            ThreePointArc((2.1717, -12.2034709059), (2.4964382446, -12.1412017169), (2.8194, -12.0702927338))
            Line((2.8194, -12.0702927338), (2.8194, -3.0025966775))
            Line((2.8194, -3.0025966775), (2.1717, -2.6286469081))
            Line((2.1717, -2.6286469081), (2.1717, -12.2034709059))
        make_face()
        with BuildLine():
            Line((2.1717, -2.6286469081), (0, -1.3748153285))
            Line((0, -1.3748153285), (0, -12.3952))
            ThreePointArc((0, -12.3952), (1.0900734993, -12.3471746892), (2.1717, -12.2034709059))
            Line((2.1717, -12.2034709059), (2.1717, -2.6286469081))
        make_face()
        with BuildLine():
            Line((0, -12.3952), (0, -1.3748153285))
            Line((0, -1.3748153285), (-2.1717, -2.6286469081))
            Line((-2.1717, -2.6286469081), (-2.1717, -12.2034709059))
            ThreePointArc((-2.1717, -12.2034709059), (-1.0900734993, -12.3471746892), (0, -12.3952))
        make_face()
        Polygon((-2.1717, -1.2538315796), (0, 0), (-1.190625, 0.6874076643), (-2.8194, -0.2529660204), (-2.8194, -1.627781349), align=None)
        with BuildLine():
            Line((-2.8194, -3.0025966775), (-10.0896089486, -7.200053771))
            ThreePointArc((-10.0896089486, -7.200053771), (-6.8985820933, -10.2980846832), (-2.8194, -12.0702927338))
            Line((-2.8194, -12.0702927338), (-2.8194, -3.0025966775))
        make_face()
        with BuildLine():
            Line((-2.8194, -0.2529660204), (-1.190625, 0.6874076643))
            Line((-1.190625, 0.6874076643), (-10.734558085, 6.1976))
            ThreePointArc((-10.734558085, 6.1976), (-12.3808628456, 0.5960018774), (-11.2802339486, -5.1378307782))
            Line((-11.2802339486, -5.1378307782), (-2.8194, -0.2529660204))
        make_face()
        with BuildLine():
            Line((-2.1717, -12.2034709059), (-2.1717, -2.6286469081))
            Line((-2.1717, -2.6286469081), (-2.8194, -3.0025966775))
            Line((-2.8194, -3.0025966775), (-2.8194, -12.0702927338))
            ThreePointArc((-2.8194, -12.0702927338), (-2.4964382446, -12.1412017169), (-2.1717, -12.2034709059))
        make_face()
        Polygon((0, -1.3748153285), (0, 0), (-2.1717, -1.2538315796), (-2.1717, -2.6286469081), align=None)
        Polygon((-2.1717, -2.6286469081), (-2.1717, -1.2538315796), (-2.8194, -1.627781349), (-2.8194, -3.0025966775), align=None)
        with BuildLine():
            Line((-2.8194, -3.0025966775), (-2.8194, -1.627781349))
            Line((-2.8194, -1.627781349), (-10.734558085, -6.1976))
            ThreePointArc((-10.734558085, -6.1976), (-10.4241408064, -6.7065841894), (-10.0896089486, -7.200053771))
            Line((-10.0896089486, -7.200053771), (-2.8194, -3.0025966775))
        make_face()
        with BuildLine():
            Line((-10.734558085, -6.1976), (-2.8194, -1.627781349))
            Line((-2.8194, -1.627781349), (-2.8194, -0.2529660204))
            Line((-2.8194, -0.2529660204), (-11.2802339486, -5.1378307782))
            ThreePointArc((-11.2802339486, -5.1378307782), (-11.0201426838, -5.6742786563), (-10.734558085, -6.1976))
        make_face()
    extrude(amount=F5_DEPTH)


solid = f1.part
